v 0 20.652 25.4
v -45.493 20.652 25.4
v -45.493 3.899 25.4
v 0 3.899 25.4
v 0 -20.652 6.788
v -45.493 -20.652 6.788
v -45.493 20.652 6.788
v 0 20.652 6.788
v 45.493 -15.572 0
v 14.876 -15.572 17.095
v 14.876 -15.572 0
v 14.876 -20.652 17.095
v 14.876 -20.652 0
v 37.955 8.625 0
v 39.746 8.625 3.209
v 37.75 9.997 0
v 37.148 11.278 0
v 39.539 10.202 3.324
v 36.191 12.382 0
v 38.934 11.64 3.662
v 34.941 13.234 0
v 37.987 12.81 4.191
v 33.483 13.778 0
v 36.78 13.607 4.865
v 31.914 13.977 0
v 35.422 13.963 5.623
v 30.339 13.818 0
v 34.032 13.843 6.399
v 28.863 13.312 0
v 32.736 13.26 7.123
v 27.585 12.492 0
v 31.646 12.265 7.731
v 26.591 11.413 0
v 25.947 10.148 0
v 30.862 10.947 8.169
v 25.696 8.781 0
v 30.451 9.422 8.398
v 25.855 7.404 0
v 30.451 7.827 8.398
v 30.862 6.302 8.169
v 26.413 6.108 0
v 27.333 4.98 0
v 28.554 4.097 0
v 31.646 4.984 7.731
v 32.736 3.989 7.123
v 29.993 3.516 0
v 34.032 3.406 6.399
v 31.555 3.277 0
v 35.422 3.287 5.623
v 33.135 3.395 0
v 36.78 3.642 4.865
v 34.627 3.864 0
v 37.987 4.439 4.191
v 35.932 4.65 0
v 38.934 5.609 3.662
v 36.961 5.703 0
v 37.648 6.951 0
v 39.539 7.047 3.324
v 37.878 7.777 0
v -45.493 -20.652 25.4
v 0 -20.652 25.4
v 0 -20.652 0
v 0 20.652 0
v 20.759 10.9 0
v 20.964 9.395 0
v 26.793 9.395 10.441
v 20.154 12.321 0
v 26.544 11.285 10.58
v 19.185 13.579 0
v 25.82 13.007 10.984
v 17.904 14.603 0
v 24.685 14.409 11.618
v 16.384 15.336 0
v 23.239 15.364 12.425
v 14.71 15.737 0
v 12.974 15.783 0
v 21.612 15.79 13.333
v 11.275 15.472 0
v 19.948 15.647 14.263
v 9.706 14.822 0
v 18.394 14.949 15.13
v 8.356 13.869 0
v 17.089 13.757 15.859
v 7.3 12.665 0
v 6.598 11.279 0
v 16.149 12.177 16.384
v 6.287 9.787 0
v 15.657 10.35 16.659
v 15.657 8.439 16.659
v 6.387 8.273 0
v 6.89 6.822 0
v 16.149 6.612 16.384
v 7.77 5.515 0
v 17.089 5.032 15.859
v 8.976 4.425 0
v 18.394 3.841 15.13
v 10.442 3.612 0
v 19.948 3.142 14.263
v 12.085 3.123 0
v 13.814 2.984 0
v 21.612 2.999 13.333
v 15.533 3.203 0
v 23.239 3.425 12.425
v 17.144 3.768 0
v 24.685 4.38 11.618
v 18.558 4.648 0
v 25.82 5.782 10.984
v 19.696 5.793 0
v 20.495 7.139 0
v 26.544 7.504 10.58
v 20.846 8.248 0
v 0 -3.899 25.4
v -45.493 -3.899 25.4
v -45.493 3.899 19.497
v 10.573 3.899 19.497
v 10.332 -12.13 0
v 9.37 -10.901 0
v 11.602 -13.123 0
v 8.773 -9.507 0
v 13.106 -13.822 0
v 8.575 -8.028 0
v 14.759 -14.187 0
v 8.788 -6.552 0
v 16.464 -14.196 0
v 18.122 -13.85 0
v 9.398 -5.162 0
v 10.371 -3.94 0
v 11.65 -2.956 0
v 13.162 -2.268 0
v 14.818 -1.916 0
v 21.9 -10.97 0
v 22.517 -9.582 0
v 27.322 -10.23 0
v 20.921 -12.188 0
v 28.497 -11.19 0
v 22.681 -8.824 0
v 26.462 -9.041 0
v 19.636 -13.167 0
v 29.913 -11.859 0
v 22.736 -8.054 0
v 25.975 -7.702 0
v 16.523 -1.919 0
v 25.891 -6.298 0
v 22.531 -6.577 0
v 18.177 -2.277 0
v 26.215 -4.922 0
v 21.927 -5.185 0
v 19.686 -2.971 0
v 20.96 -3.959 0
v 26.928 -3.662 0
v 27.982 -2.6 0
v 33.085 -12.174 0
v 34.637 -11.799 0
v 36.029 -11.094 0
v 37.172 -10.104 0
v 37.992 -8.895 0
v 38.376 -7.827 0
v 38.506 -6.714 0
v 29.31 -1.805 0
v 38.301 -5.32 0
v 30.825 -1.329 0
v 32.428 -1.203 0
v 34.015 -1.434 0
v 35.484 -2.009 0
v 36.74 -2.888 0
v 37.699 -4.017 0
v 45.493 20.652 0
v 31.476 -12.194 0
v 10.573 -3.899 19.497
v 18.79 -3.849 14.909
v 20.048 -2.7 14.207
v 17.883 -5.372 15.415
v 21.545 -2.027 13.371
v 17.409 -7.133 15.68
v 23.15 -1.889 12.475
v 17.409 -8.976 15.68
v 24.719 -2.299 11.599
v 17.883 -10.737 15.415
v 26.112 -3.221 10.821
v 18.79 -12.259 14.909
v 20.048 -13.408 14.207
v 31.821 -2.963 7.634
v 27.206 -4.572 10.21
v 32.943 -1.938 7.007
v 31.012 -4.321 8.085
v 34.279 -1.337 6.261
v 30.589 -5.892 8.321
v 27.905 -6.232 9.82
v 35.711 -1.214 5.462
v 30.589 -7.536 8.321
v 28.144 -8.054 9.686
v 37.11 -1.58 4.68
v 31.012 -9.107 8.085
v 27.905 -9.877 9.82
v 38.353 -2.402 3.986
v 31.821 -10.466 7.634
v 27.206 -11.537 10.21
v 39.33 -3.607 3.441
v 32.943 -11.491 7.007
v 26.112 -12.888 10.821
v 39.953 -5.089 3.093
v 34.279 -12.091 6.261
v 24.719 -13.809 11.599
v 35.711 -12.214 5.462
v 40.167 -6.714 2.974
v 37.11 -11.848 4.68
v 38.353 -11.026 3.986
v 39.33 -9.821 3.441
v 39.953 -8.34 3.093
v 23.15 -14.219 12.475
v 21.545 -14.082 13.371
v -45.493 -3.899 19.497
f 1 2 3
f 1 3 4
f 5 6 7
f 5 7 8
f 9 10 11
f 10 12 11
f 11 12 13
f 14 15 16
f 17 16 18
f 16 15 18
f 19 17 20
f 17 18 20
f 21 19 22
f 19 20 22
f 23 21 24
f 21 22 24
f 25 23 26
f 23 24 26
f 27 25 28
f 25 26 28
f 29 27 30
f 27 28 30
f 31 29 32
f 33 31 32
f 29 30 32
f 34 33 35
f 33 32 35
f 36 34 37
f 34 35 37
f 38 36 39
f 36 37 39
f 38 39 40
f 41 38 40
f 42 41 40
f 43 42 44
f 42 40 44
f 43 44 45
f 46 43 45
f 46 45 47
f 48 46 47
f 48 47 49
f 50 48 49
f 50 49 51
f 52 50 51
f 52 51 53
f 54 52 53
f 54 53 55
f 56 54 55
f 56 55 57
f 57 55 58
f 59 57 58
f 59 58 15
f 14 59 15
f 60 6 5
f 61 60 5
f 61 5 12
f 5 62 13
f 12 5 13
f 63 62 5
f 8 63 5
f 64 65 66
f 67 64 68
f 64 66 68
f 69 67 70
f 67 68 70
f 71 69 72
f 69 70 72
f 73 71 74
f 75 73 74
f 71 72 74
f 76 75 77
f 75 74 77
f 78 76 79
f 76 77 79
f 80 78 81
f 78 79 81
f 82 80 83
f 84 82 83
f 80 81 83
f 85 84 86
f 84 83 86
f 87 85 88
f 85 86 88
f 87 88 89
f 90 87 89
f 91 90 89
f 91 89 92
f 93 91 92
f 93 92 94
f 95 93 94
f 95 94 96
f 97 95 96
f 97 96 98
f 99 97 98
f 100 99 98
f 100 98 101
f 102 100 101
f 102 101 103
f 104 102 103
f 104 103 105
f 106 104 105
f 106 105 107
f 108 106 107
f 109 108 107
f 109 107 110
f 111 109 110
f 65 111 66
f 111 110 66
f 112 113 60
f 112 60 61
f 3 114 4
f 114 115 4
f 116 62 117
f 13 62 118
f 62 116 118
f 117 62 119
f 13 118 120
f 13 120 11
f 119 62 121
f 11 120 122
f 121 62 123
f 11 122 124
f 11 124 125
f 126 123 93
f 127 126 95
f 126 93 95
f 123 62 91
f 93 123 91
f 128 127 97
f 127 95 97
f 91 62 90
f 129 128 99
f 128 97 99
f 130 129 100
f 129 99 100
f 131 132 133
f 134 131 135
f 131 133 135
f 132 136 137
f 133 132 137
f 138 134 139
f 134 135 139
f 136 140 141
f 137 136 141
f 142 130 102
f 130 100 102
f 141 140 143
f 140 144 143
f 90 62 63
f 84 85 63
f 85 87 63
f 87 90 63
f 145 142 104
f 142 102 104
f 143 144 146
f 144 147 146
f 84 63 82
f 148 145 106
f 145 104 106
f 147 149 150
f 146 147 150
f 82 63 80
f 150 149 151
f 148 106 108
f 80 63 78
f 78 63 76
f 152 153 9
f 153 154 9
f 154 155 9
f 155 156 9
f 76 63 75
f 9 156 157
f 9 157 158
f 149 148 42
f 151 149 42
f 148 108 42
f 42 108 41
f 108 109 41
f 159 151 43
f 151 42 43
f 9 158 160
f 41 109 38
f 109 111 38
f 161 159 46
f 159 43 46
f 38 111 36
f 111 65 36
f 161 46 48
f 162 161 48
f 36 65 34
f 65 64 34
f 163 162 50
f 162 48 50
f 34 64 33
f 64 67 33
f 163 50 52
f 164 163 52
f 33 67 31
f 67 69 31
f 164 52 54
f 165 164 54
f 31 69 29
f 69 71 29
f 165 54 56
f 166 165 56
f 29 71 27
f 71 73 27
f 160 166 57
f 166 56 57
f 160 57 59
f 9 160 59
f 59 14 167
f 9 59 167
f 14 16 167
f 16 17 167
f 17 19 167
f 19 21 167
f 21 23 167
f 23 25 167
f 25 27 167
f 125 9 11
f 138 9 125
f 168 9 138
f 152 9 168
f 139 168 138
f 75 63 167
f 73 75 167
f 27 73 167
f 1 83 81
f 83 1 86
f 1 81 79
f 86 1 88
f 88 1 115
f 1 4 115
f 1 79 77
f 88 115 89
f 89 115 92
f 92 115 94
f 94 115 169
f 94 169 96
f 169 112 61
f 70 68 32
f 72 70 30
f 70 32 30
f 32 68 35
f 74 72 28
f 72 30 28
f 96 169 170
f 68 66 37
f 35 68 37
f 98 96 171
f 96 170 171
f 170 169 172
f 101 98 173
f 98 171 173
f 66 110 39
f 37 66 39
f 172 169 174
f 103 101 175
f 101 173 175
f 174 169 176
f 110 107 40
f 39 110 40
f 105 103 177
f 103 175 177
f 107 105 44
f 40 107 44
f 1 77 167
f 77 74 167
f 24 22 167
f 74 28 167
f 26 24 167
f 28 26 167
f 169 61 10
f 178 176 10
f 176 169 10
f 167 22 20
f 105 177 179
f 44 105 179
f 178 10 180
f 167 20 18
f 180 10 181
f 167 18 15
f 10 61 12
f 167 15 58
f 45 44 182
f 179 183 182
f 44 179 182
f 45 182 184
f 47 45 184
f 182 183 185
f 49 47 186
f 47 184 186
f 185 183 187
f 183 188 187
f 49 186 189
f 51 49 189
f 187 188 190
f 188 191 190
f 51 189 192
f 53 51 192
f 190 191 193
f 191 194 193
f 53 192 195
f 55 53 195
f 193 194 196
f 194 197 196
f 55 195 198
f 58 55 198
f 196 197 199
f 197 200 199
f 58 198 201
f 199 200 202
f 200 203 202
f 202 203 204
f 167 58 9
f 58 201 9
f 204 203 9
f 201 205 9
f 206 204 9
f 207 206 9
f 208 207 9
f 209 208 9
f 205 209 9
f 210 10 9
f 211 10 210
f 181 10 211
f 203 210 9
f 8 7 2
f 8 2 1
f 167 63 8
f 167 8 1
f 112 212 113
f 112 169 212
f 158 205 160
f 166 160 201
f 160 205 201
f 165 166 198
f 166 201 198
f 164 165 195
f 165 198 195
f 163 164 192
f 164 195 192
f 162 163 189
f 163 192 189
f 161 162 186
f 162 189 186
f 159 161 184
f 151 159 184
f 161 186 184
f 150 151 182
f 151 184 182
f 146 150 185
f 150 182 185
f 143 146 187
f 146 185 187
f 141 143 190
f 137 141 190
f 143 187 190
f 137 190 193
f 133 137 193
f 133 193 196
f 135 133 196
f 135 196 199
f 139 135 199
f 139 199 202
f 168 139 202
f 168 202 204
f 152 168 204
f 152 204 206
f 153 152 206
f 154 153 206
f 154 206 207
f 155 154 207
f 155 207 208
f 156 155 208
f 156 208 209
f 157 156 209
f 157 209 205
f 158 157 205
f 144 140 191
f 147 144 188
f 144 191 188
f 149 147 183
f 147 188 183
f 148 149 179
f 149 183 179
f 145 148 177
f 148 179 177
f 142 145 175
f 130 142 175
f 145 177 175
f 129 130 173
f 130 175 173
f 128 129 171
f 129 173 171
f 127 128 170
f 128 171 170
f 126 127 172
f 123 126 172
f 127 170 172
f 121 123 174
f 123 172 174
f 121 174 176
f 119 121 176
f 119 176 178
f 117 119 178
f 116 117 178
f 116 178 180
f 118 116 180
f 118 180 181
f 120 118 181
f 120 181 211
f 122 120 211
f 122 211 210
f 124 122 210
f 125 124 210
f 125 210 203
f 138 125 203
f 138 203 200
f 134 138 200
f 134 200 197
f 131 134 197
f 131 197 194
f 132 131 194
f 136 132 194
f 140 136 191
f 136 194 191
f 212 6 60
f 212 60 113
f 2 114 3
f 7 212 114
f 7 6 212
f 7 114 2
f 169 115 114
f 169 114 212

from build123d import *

# Parameters (mm, degrees)
F0_W      = 90.986096
F0_H      = 41.3048
F1_DEPTH  = 25.4
F3_DEPTH  = 50.8
F4_W      = 7.798808
F4_H      = 5.902978
F5_DEPTH  = 101.6
F6_R      = 6.182282
F6_R_2    = 6.41324
F6_R_3    = 5.352968
F6_R_4    = 5.515412
F7_DEPTH  = 44.355903
F9_DEPTH  = 5.08
F10_W     = 45.493048
F10_H     = 6.787852
F11_DEPTH = 41.305801


with BuildPart() as f1:
    # F0 (on Top) → F1 (new body)
    with BuildSketch(Plane.XY):
        Rectangle(F0_W, F0_H)
    extrude(amount=F1_DEPTH)

    # F2 (on face) → F3 (cut)
    with BuildSketch(Plane.XZ.offset(20.6524)):
        Polygon((45.493048, 25.4), (0, 25.4), (45.493048, 0), align=None)
    extrude(amount=-F3_DEPTH, mode=Mode.SUBTRACT)

    # F4 (on face) → F5 (cut)
    with BuildSketch(Plane(origin=(-45.493048, 0, 0), x_dir=(0, -1, 0), z_dir=(-1, 0, 0))):
        with Locations((-1e-06, 22.448511)):
            Rectangle(F4_W, F4_H)
    extrude(amount=-F5_DEPTH, mode=Mode.SUBTRACT)

    # F6 (on face) → F7 (cut, through all)
    with BuildSketch(Plane(origin=(10.811308, 0, 19.363754), x_dir=(0.873128, 0, -0.487491), z_dir=(0.487491, 0, 0.873128))):
        with Locations((13.669491, -8.054403)):
            Circle(F6_R)
        with Locations((11.890859, 9.394533)):
            Circle(F6_R_2)
        with Locations((27.786525, 8.624507)):
            Circle(F6_R_3)
        with Locations((28.105455, -6.714204)):
            Circle(F6_R_4)
    extrude(amount=-F7_DEPTH, mode=Mode.SUBTRACT)

    # F8 (on face) → F9 (cut)
    with BuildSketch(Plane.XZ.offset(20.6524)):
        Polygon((14.875505, 17.094603), (14.875505, 0), (45.493048, 0), align=None)
    extrude(amount=-F9_DEPTH, mode=Mode.SUBTRACT)

    # F10 (on face) → F11 (cut, through all)
    with BuildSketch(Plane.XZ.offset(20.6524)):
        with Locations((-22.746524, 3.393926)):
            Rectangle(F10_W, F10_H)
    extrude(amount=-F11_DEPTH, mode=Mode.SUBTRACT)


solid = f1.part
